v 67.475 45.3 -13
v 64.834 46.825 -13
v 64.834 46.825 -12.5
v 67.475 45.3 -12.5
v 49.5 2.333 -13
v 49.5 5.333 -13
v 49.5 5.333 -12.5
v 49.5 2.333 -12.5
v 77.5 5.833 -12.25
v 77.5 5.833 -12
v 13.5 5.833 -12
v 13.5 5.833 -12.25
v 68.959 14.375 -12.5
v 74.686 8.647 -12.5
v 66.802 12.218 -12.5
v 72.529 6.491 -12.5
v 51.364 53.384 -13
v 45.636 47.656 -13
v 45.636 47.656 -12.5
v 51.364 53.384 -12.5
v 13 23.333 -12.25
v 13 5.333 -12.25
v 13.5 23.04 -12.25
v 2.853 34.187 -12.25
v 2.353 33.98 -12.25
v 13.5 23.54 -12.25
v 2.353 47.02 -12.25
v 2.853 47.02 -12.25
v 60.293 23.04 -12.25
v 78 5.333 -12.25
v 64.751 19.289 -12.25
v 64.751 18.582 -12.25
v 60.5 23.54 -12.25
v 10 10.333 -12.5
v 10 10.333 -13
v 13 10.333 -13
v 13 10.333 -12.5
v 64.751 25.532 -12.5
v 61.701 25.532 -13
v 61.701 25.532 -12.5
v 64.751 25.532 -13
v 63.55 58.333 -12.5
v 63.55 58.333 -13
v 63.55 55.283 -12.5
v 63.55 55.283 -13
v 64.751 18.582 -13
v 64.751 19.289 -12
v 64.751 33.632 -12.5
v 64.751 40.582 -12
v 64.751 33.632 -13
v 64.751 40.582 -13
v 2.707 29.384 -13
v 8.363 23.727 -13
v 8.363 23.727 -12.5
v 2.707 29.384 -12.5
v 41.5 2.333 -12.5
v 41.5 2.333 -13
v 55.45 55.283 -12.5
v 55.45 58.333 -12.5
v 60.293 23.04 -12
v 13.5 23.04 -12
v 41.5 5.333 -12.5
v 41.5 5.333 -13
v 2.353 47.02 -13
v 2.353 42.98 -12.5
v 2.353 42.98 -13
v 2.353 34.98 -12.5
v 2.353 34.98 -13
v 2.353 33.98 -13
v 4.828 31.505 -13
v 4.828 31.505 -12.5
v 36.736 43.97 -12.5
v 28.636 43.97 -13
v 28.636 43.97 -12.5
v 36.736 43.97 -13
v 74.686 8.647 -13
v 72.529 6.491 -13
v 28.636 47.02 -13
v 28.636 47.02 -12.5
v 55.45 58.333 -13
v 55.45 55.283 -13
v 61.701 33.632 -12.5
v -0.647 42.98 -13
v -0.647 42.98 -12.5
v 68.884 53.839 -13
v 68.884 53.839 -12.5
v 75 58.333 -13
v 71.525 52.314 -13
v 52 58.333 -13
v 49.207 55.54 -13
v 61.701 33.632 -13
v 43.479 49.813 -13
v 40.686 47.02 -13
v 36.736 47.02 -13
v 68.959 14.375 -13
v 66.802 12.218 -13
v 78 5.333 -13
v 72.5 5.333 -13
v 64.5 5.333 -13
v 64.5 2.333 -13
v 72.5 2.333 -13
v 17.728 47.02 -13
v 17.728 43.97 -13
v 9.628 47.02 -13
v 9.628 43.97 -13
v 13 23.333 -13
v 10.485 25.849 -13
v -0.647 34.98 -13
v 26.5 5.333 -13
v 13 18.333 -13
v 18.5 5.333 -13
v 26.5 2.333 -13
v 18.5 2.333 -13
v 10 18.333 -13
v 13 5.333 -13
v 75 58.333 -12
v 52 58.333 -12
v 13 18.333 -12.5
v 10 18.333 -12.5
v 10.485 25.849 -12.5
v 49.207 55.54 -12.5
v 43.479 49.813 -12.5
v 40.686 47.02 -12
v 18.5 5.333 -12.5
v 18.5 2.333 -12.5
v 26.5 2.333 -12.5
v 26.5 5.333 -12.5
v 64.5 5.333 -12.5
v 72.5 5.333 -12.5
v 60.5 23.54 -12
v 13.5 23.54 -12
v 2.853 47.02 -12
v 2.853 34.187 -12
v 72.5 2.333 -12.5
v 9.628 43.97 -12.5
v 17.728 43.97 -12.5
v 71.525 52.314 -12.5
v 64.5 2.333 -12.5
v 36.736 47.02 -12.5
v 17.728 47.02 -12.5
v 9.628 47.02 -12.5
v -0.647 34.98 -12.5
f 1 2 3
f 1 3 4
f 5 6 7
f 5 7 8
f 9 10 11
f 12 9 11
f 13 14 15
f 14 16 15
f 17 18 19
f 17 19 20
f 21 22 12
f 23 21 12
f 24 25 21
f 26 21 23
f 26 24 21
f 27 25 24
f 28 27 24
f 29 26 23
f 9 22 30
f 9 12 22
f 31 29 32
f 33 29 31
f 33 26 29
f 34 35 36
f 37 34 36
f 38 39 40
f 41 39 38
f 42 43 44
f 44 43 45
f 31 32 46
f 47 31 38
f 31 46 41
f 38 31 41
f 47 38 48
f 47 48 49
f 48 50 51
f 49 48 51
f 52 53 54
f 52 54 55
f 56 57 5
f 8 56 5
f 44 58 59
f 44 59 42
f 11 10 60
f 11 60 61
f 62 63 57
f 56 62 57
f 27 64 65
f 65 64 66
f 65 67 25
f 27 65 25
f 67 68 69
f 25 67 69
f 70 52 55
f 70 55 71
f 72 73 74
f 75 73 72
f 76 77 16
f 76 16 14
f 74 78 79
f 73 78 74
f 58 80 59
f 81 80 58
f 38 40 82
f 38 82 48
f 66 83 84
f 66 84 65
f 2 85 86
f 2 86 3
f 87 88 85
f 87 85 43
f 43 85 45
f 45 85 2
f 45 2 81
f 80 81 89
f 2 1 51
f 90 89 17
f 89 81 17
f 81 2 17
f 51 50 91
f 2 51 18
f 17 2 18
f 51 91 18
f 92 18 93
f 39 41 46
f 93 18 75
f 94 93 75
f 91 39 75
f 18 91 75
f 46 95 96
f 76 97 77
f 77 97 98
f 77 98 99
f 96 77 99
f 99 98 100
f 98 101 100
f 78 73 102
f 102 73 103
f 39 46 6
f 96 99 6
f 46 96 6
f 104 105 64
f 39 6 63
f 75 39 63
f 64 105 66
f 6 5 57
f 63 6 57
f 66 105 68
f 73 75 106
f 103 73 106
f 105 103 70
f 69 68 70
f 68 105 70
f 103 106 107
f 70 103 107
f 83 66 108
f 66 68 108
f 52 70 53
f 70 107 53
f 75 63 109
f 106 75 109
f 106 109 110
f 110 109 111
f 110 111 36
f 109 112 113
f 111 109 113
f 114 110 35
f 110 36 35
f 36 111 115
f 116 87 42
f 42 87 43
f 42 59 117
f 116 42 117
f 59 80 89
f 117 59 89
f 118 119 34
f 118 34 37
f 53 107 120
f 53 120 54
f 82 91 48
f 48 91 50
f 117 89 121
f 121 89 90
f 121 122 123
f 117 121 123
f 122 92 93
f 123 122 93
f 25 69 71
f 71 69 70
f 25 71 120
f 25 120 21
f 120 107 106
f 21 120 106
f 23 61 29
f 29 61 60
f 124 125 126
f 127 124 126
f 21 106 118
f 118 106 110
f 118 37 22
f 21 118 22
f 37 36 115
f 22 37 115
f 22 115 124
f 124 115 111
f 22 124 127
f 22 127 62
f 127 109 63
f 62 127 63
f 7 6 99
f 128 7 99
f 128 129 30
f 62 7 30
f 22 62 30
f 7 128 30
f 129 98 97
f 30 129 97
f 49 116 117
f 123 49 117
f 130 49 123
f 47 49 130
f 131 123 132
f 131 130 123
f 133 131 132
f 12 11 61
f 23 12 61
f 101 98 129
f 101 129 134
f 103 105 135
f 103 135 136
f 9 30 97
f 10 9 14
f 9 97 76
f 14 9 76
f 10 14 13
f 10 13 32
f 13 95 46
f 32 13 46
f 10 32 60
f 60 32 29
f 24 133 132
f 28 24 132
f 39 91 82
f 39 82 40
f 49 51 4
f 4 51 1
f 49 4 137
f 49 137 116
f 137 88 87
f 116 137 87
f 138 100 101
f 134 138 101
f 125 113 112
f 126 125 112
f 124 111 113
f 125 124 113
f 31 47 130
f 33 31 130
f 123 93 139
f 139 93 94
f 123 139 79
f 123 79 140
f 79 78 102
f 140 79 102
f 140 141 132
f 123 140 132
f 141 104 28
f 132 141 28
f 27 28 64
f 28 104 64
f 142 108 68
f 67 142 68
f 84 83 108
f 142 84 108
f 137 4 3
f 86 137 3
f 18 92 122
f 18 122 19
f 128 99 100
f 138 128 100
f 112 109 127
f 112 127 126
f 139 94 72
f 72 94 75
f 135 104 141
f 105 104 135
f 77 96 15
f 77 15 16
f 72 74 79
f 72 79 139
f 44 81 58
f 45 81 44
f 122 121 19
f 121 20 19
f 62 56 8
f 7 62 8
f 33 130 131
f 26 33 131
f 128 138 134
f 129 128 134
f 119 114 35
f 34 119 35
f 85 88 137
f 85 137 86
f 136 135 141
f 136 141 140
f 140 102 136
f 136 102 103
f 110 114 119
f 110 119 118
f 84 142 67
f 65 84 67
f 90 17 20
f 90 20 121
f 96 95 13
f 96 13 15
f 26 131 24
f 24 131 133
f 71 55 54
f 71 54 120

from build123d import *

# Parameters (mm, degrees)
PAD025_DEPTH    = 1
SKETCH038_W     = 8.1
SKETCH038_H     = 3.05
SKETCH038_W_2   = 3.05
SKETCH038_H_2   = 8.1
POCKET013_DEPTH = 0.5
POCKET014_DEPTH = 0.25
POCKET015_DEPTH = 0.25
SKETCH041_W     = 8
SKETCH041_H     = 3
SKETCH041_W_2   = 3
SKETCH041_H_2   = 8
PAD026_DEPTH    = 0.5


with BuildPart() as part:
    # Sketch037 (on Face2 of Binder012) → Pad025 (new body)
    with BuildSketch(Plane(origin=(0, 0, -13), x_dir=(1, 0, 0), z_dir=(0, 0, -1))):
        Polygon((75, -58.333333), (52, -58.333333), (40.686291501, -47.019624501), (2.352991501, -47.019624501), (2.352991501, -33.980341499), (13, -23.333333), (13, -5.333333), (78, -5.333333), (64.751288694, -18.582044306), (64.751288694, -40.582044306), align=None)
    extrude(amount=-PAD025_DEPTH)

    # Sketch038 (on Face11 of Pad025) → Pocket013 (cut)
    with BuildSketch(Plane(origin=(0, 0, -13), x_dir=(1, 0, 0), z_dir=(0, 0, -1))):
        with Locations((13.677991501, -45.494624501)):
            Rectangle(SKETCH038_W, SKETCH038_H)
        with Locations((32.686291501, -45.494624501)):
            Rectangle(SKETCH038_W, SKETCH038_H)
        with Locations((63.226288694, -29.582044306)):
            Rectangle(SKETCH038_W_2, SKETCH038_H_2)
        Polygon((74.6861389697, -8.6471940303), (68.9585740421, -14.3747589579), (66.8018983595, -12.2180832753), (72.5294632871, -6.4905183477), align=None)
        Polygon((67.475, -45.299650673), (71.525, -52.3144564437), (68.8836225185, -53.8394564437), (64.8336225185, -46.824650673), align=None)
        Polygon((49.2069282143, -55.5402612143), (43.4793632867, -49.8126962867), (45.6360389693, -47.6560206041), (51.3636038969, -53.3835855317), align=None)
        with Locations((59.5, -56.808333)):
            Rectangle(SKETCH038_W, SKETCH038_H)
    extrude(amount=-POCKET013_DEPTH, mode=Mode.SUBTRACT)

    # Sketch039 (on Face7 of Pocket013) → Pocket014 (cut)
    with BuildSketch(Plane.XY.offset(-12)):
        Polygon((2.352991501, 47.019624501), (2.352991501, 33.980341499), (13, 23.333333), (13, 5.333333), (78, 5.333333), (77.5, 5.833333), (13.5, 5.833333), (13.5, 23.5404397812), (2.852991501, 34.1874482802), (2.852991501, 47.019624501), align=None)
    extrude(amount=-POCKET014_DEPTH, mode=Mode.SUBTRACT)

    # Sketch040 (on Face7 of Pocket014) → Pocket015 (cut)
    with BuildSketch(Plane.XY.offset(-12)):
        Polygon((64.751288694, 19.2891510872), (60.5, 23.5404397812), (13.5, 23.5404397812), (13.5, 23.0404397812), (60.2928932188, 23.0404397812), (64.751288694, 18.582044306), align=None)
    extrude(amount=-POCKET015_DEPTH, mode=Mode.SUBTRACT)

    # Sketch041 (on Face2 of Pocket015) → Pad026 (join)
    with BuildSketch(Plane(origin=(0, 0, -13), x_dir=(1, 0, 0), z_dir=(0, 0, -1))):
        with Locations((68.5, -3.833333)):
            Rectangle(SKETCH041_W, SKETCH041_H)
        with Locations((45.5, -3.833333)):
            Rectangle(SKETCH041_W, SKETCH041_H)
        with Locations((22.5, -3.833333)):
            Rectangle(SKETCH041_W, SKETCH041_H)
        with Locations((11.5, -14.333333)):
            Rectangle(SKETCH041_W_2, SKETCH041_H_2)
        with Locations((0.852991501, -38.980341499)):
            Rectangle(SKETCH041_W_2, SKETCH041_H_2)
        Polygon((4.8278652352, -31.5054677648), (10.4847194847, -25.8486135153), (8.3633991411, -23.7272931718), (2.7065448916, -29.3841474213), align=None)
    extrude(amount=-PAD026_DEPTH)


solid = part.part
